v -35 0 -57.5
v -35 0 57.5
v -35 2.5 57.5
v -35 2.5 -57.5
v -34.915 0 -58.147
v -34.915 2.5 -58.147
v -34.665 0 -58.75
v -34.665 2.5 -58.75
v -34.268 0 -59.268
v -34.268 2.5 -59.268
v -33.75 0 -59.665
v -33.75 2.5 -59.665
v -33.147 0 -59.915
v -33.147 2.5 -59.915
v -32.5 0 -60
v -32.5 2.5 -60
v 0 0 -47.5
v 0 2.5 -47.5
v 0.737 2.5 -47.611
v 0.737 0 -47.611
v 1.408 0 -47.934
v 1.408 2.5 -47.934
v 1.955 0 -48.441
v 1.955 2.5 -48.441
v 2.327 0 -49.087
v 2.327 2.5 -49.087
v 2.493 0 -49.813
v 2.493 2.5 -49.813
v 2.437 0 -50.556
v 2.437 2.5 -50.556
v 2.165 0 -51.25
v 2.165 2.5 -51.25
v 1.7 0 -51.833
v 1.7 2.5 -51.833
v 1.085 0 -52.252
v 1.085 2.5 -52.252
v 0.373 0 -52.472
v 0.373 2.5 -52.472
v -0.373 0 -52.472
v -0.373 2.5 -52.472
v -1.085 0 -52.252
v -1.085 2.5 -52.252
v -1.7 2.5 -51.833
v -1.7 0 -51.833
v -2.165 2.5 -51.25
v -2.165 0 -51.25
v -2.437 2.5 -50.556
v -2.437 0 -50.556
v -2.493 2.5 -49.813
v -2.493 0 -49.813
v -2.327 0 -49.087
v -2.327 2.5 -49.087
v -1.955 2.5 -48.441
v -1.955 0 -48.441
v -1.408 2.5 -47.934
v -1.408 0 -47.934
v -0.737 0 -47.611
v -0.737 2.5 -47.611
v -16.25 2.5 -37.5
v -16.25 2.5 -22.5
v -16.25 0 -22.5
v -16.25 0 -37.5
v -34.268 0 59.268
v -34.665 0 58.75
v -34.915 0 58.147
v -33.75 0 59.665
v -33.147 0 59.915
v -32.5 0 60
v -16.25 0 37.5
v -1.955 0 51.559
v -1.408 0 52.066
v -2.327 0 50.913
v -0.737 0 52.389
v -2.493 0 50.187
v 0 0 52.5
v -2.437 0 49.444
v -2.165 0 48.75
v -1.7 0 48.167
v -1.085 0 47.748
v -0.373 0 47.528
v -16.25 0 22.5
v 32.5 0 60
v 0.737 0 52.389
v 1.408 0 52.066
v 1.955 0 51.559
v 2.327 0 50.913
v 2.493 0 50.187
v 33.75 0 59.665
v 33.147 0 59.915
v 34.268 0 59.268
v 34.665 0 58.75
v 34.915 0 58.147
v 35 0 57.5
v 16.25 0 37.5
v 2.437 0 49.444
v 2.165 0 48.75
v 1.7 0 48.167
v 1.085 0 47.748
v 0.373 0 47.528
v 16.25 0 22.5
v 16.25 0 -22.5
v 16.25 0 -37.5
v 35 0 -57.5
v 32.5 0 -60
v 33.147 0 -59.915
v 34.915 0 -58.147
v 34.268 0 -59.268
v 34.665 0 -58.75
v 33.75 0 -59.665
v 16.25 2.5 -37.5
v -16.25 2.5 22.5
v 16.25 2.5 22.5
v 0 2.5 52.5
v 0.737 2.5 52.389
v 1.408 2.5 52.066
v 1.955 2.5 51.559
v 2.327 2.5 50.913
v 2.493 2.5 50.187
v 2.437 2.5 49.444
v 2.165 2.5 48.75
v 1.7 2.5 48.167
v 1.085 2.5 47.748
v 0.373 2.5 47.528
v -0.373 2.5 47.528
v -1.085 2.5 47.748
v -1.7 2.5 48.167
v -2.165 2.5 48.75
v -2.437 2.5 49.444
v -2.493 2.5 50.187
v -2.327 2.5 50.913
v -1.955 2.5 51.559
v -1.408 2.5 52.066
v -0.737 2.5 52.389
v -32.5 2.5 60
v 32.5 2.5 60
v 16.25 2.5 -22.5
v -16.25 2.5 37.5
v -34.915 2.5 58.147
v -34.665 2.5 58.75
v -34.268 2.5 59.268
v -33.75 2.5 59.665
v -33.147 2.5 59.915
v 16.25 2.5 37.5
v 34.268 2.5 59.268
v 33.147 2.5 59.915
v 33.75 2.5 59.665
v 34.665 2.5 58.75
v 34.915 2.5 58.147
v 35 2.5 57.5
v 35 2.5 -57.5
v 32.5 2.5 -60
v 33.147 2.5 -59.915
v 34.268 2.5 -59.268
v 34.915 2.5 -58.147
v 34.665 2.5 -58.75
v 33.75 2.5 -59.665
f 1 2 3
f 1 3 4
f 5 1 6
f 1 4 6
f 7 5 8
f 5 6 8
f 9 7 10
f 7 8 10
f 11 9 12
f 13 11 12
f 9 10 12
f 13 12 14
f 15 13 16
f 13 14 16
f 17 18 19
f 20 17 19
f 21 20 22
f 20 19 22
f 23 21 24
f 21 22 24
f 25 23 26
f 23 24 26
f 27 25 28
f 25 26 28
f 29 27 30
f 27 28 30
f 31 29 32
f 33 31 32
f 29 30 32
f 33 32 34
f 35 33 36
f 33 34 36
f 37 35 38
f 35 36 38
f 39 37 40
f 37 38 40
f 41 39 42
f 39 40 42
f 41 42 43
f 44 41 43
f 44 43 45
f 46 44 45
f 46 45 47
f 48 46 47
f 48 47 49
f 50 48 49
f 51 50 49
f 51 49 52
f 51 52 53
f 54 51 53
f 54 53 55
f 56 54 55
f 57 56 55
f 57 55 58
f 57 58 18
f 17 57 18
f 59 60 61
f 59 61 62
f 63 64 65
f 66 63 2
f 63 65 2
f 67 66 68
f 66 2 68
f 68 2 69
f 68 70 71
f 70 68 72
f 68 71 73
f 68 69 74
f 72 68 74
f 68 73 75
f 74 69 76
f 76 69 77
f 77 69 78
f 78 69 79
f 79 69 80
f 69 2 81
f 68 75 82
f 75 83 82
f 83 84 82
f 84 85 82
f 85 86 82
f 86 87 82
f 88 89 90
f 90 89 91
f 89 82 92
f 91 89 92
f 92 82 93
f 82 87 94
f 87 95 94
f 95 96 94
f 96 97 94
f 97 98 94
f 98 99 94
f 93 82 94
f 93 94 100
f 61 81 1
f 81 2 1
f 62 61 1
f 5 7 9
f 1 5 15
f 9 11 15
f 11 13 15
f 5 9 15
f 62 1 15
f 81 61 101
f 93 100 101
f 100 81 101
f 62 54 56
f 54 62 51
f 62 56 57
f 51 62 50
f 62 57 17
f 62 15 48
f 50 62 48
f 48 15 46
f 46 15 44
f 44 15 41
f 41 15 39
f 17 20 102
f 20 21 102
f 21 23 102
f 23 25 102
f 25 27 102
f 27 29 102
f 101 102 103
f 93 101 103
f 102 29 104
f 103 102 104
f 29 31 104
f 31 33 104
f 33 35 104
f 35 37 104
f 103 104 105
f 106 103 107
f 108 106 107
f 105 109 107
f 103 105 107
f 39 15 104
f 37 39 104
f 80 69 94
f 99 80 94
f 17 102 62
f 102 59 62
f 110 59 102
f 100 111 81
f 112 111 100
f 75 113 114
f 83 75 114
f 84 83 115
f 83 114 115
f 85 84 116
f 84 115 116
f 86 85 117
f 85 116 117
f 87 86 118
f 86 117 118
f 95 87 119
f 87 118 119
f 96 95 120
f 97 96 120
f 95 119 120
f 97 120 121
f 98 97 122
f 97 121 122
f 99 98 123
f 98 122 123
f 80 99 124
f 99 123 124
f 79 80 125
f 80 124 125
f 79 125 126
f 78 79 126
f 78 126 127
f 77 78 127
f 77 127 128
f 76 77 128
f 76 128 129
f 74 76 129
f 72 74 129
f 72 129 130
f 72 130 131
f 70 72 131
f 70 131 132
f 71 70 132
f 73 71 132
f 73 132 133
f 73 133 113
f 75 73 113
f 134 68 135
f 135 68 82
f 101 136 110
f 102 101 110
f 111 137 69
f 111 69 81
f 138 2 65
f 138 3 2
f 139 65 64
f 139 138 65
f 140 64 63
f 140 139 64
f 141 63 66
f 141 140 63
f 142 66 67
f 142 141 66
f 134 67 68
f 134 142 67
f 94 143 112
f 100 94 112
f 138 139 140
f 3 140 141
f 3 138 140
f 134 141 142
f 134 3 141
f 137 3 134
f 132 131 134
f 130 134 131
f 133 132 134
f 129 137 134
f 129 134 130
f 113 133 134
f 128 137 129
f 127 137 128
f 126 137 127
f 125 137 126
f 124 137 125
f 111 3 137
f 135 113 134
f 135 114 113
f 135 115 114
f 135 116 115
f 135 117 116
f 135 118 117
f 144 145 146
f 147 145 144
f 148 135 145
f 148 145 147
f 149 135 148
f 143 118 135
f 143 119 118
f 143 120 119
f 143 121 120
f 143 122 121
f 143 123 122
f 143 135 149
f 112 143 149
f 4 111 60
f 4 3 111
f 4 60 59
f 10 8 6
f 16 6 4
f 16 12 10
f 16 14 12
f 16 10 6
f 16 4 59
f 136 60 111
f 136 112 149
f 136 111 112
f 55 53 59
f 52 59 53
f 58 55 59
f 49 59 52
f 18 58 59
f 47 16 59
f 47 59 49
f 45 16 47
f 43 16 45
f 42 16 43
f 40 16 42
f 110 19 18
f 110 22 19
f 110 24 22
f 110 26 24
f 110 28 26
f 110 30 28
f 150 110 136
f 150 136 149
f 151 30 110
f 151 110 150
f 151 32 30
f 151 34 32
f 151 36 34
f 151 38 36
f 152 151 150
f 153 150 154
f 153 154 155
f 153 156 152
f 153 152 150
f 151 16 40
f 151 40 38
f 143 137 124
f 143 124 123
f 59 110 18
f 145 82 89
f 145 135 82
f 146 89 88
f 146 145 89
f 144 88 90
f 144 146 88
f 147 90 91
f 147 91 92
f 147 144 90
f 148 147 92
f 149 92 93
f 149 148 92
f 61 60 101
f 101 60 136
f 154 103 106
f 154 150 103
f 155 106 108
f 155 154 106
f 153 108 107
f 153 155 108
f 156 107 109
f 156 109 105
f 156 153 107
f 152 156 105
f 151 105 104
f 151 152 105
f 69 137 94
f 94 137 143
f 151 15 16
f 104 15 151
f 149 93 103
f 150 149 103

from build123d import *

# Parameters (mm, degrees)
CROQUIS1_W              = 70
CROQUIS1_H              = 120
SALIENTE_EXTRUIR1_DEPTH = 2.5
REDONDEO1_R             = 2.5
CROQUIS2_W              = 32.5
CROQUIS2_H              = 15
CORTAR_EXTRUIR1_DEPTH   = 70.507193872
CROQUIS3_R              = 2.5
CORTAR_EXTRUIR2_DEPTH   = 70.507193872


with BuildPart() as part:
    # Croquis1 → Saliente-Extruir1 (new body)
    with BuildSketch(Plane(origin=(0, 0, 0), x_dir=(1, 0, 0), z_dir=(0, 1, 0))):
        Rectangle(CROQUIS1_W, CROQUIS1_H)
    extrude(amount=SALIENTE_EXTRUIR1_DEPTH)

    # Redondeo1
    redondeo1_edges = [part.edges().sort_by_distance(p)[0] for p in [
        (35, 1.25, 60),
        (-35, 1.25, 60),
        (-35, 1.25, -60),
        (35, 1.25, -60),
    ]]
    fillet(redondeo1_edges, radius=REDONDEO1_R)

    # Croquis2 → Cortar-Extruir1 (cut, through all)
    with BuildSketch(Plane(origin=(0, 2.5, 0), x_dir=(1, 0, 0), z_dir=(0, 1, 0))):
        with Locations((0, 30)):
            Rectangle(CROQUIS2_W, CROQUIS2_H)
        with Locations((0, -30)):
            Rectangle(CROQUIS2_W, CROQUIS2_H)
    extrude(amount=-CORTAR_EXTRUIR1_DEPTH, mode=Mode.SUBTRACT)

    # Croquis3 → Cortar-Extruir2 (cut, through all)
    with BuildSketch(Plane(origin=(0, 2.5, 0), x_dir=(1, 0, 0), z_dir=(0, 1, 0))):
        with Locations(Location((0, 50, 0), (0, 0, 270))):
            Circle(CROQUIS3_R)
        with Locations(Location((0, -50, 0), (0, 0, 270))):
            Circle(CROQUIS3_R)
    extrude(amount=-CORTAR_EXTRUIR2_DEPTH, mode=Mode.SUBTRACT)


solid = part.part
